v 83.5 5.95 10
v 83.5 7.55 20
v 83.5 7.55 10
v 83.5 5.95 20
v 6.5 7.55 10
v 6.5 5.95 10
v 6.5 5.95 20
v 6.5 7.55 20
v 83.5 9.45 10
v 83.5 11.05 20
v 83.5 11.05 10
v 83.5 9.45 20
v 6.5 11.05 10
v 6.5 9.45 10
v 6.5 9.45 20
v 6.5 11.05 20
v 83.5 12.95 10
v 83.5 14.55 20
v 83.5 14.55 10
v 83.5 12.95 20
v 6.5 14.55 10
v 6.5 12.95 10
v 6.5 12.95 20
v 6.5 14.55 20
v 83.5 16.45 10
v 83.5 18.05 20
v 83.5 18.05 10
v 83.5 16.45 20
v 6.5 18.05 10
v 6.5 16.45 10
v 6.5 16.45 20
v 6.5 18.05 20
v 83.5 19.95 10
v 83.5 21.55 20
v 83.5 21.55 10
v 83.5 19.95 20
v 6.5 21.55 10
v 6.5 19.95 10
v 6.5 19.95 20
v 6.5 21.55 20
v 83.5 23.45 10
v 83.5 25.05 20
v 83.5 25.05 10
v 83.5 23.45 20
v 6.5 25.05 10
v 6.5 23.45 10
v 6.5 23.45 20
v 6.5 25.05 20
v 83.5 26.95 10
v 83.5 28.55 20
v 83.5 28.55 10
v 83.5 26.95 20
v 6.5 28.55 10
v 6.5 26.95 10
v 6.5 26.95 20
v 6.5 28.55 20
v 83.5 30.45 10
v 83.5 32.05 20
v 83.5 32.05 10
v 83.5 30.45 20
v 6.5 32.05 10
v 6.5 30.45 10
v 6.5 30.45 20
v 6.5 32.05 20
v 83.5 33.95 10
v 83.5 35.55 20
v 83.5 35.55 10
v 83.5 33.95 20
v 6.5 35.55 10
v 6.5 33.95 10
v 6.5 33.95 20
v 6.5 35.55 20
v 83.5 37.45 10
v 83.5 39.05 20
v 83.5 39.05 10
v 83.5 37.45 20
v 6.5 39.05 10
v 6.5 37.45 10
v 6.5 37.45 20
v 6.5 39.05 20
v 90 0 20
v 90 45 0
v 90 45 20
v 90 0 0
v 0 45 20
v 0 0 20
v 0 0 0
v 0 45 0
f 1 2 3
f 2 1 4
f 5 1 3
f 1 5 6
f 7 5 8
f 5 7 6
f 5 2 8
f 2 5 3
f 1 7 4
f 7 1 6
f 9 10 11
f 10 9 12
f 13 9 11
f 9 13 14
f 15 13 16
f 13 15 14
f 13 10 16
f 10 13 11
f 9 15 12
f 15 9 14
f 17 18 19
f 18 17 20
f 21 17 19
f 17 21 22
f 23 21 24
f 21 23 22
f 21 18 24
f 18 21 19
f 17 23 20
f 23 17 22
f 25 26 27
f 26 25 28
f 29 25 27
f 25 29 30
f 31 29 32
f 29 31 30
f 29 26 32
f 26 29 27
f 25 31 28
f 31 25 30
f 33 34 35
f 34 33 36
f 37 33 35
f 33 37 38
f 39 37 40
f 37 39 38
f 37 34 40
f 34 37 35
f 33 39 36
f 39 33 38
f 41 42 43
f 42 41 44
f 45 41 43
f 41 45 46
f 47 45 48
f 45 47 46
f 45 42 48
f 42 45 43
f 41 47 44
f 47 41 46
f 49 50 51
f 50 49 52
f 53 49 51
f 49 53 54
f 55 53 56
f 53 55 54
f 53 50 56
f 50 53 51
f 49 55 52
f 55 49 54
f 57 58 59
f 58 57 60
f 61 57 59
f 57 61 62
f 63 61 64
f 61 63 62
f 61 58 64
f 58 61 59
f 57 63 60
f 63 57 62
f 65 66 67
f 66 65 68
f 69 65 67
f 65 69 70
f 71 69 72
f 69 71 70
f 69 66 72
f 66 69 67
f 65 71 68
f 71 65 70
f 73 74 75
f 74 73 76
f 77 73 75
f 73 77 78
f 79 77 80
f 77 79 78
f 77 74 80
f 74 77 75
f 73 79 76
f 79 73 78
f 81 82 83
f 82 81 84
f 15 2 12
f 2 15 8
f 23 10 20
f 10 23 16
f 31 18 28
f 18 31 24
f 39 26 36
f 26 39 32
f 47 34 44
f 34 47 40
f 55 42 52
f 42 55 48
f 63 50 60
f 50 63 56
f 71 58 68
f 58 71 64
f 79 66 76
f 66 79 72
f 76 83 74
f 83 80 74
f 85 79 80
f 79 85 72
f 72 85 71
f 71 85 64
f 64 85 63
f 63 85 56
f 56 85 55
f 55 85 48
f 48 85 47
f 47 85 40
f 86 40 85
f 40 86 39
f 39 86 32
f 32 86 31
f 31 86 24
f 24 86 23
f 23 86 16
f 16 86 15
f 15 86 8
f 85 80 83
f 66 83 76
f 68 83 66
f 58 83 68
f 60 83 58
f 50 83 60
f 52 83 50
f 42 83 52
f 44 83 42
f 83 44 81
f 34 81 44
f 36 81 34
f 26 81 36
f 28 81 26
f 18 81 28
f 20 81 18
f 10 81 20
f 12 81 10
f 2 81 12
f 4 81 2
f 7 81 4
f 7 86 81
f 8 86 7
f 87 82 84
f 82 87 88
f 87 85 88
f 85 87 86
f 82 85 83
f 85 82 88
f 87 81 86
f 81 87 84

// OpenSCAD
// Drying rack for 10 microscope slides
// Slide dimensions: 75 x 25 x 1 mm (L x W x T)
// Base dimensions: 90 x 45 x 20 mm (X x Y x Z)
// Slots: 10 parallel slots along X, 77 mm long, 1.6 mm wide, 10 mm deep
// Slot spacing: 3.5 mm centre-to-centre in Y
// Slots centred on block in X and Y

// Base dimensions
base_length = 90;   // X
base_width  = 45;   // Y
base_height = 20;   // Z

// Slot dimensions
num_slots    = 10;
slot_length  = 77;  // along X
slot_width   = 1.6; // along Y
slot_depth   = 10;  // along Z
slot_pitch   = 3.5; // centre-to-centre spacing in Y

// Calculate slot positions
// Total slot width + gaps: num_slots * slot_width + (num_slots - 1) * (slot_pitch - slot_width)
// But we want slots centred, so we compute the total width occupied by slots and gaps
total_slot_width = num_slots * slot_width + (num_slots - 1) * (slot_pitch - slot_width);
// Offset from centre to first slot edge
first_slot_offset = (base_width - total_slot_width) / 2;

// Set resolution for curves
$fn = 64;

// Base block
module base_block() {
    cube([base_length, base_width, base_height]);
}

// Slot module
module slot() {
    // Slot runs along X, so extrude along X
    cube([slot_length, slot_width, slot_depth + 0.01]);
}

// Build the rack
module drying_rack() {
    difference() {
        // Base block
        base_block();
        
        // Cut slots
        for (i = [0 : num_slots - 1]) {
            // Calculate Y position of each slot (from bottom)
            y_pos = first_slot_offset + i * slot_pitch;
            // Position slot: centred in X (base_length/2 - slot_length/2), at y_pos, at top (base_height - slot_depth)
            translate([
                (base_length - slot_length) / 2,
                y_pos,
                base_height - slot_depth
            ]) {
                slot();
            }
        }
    }
}

drying_rack();
